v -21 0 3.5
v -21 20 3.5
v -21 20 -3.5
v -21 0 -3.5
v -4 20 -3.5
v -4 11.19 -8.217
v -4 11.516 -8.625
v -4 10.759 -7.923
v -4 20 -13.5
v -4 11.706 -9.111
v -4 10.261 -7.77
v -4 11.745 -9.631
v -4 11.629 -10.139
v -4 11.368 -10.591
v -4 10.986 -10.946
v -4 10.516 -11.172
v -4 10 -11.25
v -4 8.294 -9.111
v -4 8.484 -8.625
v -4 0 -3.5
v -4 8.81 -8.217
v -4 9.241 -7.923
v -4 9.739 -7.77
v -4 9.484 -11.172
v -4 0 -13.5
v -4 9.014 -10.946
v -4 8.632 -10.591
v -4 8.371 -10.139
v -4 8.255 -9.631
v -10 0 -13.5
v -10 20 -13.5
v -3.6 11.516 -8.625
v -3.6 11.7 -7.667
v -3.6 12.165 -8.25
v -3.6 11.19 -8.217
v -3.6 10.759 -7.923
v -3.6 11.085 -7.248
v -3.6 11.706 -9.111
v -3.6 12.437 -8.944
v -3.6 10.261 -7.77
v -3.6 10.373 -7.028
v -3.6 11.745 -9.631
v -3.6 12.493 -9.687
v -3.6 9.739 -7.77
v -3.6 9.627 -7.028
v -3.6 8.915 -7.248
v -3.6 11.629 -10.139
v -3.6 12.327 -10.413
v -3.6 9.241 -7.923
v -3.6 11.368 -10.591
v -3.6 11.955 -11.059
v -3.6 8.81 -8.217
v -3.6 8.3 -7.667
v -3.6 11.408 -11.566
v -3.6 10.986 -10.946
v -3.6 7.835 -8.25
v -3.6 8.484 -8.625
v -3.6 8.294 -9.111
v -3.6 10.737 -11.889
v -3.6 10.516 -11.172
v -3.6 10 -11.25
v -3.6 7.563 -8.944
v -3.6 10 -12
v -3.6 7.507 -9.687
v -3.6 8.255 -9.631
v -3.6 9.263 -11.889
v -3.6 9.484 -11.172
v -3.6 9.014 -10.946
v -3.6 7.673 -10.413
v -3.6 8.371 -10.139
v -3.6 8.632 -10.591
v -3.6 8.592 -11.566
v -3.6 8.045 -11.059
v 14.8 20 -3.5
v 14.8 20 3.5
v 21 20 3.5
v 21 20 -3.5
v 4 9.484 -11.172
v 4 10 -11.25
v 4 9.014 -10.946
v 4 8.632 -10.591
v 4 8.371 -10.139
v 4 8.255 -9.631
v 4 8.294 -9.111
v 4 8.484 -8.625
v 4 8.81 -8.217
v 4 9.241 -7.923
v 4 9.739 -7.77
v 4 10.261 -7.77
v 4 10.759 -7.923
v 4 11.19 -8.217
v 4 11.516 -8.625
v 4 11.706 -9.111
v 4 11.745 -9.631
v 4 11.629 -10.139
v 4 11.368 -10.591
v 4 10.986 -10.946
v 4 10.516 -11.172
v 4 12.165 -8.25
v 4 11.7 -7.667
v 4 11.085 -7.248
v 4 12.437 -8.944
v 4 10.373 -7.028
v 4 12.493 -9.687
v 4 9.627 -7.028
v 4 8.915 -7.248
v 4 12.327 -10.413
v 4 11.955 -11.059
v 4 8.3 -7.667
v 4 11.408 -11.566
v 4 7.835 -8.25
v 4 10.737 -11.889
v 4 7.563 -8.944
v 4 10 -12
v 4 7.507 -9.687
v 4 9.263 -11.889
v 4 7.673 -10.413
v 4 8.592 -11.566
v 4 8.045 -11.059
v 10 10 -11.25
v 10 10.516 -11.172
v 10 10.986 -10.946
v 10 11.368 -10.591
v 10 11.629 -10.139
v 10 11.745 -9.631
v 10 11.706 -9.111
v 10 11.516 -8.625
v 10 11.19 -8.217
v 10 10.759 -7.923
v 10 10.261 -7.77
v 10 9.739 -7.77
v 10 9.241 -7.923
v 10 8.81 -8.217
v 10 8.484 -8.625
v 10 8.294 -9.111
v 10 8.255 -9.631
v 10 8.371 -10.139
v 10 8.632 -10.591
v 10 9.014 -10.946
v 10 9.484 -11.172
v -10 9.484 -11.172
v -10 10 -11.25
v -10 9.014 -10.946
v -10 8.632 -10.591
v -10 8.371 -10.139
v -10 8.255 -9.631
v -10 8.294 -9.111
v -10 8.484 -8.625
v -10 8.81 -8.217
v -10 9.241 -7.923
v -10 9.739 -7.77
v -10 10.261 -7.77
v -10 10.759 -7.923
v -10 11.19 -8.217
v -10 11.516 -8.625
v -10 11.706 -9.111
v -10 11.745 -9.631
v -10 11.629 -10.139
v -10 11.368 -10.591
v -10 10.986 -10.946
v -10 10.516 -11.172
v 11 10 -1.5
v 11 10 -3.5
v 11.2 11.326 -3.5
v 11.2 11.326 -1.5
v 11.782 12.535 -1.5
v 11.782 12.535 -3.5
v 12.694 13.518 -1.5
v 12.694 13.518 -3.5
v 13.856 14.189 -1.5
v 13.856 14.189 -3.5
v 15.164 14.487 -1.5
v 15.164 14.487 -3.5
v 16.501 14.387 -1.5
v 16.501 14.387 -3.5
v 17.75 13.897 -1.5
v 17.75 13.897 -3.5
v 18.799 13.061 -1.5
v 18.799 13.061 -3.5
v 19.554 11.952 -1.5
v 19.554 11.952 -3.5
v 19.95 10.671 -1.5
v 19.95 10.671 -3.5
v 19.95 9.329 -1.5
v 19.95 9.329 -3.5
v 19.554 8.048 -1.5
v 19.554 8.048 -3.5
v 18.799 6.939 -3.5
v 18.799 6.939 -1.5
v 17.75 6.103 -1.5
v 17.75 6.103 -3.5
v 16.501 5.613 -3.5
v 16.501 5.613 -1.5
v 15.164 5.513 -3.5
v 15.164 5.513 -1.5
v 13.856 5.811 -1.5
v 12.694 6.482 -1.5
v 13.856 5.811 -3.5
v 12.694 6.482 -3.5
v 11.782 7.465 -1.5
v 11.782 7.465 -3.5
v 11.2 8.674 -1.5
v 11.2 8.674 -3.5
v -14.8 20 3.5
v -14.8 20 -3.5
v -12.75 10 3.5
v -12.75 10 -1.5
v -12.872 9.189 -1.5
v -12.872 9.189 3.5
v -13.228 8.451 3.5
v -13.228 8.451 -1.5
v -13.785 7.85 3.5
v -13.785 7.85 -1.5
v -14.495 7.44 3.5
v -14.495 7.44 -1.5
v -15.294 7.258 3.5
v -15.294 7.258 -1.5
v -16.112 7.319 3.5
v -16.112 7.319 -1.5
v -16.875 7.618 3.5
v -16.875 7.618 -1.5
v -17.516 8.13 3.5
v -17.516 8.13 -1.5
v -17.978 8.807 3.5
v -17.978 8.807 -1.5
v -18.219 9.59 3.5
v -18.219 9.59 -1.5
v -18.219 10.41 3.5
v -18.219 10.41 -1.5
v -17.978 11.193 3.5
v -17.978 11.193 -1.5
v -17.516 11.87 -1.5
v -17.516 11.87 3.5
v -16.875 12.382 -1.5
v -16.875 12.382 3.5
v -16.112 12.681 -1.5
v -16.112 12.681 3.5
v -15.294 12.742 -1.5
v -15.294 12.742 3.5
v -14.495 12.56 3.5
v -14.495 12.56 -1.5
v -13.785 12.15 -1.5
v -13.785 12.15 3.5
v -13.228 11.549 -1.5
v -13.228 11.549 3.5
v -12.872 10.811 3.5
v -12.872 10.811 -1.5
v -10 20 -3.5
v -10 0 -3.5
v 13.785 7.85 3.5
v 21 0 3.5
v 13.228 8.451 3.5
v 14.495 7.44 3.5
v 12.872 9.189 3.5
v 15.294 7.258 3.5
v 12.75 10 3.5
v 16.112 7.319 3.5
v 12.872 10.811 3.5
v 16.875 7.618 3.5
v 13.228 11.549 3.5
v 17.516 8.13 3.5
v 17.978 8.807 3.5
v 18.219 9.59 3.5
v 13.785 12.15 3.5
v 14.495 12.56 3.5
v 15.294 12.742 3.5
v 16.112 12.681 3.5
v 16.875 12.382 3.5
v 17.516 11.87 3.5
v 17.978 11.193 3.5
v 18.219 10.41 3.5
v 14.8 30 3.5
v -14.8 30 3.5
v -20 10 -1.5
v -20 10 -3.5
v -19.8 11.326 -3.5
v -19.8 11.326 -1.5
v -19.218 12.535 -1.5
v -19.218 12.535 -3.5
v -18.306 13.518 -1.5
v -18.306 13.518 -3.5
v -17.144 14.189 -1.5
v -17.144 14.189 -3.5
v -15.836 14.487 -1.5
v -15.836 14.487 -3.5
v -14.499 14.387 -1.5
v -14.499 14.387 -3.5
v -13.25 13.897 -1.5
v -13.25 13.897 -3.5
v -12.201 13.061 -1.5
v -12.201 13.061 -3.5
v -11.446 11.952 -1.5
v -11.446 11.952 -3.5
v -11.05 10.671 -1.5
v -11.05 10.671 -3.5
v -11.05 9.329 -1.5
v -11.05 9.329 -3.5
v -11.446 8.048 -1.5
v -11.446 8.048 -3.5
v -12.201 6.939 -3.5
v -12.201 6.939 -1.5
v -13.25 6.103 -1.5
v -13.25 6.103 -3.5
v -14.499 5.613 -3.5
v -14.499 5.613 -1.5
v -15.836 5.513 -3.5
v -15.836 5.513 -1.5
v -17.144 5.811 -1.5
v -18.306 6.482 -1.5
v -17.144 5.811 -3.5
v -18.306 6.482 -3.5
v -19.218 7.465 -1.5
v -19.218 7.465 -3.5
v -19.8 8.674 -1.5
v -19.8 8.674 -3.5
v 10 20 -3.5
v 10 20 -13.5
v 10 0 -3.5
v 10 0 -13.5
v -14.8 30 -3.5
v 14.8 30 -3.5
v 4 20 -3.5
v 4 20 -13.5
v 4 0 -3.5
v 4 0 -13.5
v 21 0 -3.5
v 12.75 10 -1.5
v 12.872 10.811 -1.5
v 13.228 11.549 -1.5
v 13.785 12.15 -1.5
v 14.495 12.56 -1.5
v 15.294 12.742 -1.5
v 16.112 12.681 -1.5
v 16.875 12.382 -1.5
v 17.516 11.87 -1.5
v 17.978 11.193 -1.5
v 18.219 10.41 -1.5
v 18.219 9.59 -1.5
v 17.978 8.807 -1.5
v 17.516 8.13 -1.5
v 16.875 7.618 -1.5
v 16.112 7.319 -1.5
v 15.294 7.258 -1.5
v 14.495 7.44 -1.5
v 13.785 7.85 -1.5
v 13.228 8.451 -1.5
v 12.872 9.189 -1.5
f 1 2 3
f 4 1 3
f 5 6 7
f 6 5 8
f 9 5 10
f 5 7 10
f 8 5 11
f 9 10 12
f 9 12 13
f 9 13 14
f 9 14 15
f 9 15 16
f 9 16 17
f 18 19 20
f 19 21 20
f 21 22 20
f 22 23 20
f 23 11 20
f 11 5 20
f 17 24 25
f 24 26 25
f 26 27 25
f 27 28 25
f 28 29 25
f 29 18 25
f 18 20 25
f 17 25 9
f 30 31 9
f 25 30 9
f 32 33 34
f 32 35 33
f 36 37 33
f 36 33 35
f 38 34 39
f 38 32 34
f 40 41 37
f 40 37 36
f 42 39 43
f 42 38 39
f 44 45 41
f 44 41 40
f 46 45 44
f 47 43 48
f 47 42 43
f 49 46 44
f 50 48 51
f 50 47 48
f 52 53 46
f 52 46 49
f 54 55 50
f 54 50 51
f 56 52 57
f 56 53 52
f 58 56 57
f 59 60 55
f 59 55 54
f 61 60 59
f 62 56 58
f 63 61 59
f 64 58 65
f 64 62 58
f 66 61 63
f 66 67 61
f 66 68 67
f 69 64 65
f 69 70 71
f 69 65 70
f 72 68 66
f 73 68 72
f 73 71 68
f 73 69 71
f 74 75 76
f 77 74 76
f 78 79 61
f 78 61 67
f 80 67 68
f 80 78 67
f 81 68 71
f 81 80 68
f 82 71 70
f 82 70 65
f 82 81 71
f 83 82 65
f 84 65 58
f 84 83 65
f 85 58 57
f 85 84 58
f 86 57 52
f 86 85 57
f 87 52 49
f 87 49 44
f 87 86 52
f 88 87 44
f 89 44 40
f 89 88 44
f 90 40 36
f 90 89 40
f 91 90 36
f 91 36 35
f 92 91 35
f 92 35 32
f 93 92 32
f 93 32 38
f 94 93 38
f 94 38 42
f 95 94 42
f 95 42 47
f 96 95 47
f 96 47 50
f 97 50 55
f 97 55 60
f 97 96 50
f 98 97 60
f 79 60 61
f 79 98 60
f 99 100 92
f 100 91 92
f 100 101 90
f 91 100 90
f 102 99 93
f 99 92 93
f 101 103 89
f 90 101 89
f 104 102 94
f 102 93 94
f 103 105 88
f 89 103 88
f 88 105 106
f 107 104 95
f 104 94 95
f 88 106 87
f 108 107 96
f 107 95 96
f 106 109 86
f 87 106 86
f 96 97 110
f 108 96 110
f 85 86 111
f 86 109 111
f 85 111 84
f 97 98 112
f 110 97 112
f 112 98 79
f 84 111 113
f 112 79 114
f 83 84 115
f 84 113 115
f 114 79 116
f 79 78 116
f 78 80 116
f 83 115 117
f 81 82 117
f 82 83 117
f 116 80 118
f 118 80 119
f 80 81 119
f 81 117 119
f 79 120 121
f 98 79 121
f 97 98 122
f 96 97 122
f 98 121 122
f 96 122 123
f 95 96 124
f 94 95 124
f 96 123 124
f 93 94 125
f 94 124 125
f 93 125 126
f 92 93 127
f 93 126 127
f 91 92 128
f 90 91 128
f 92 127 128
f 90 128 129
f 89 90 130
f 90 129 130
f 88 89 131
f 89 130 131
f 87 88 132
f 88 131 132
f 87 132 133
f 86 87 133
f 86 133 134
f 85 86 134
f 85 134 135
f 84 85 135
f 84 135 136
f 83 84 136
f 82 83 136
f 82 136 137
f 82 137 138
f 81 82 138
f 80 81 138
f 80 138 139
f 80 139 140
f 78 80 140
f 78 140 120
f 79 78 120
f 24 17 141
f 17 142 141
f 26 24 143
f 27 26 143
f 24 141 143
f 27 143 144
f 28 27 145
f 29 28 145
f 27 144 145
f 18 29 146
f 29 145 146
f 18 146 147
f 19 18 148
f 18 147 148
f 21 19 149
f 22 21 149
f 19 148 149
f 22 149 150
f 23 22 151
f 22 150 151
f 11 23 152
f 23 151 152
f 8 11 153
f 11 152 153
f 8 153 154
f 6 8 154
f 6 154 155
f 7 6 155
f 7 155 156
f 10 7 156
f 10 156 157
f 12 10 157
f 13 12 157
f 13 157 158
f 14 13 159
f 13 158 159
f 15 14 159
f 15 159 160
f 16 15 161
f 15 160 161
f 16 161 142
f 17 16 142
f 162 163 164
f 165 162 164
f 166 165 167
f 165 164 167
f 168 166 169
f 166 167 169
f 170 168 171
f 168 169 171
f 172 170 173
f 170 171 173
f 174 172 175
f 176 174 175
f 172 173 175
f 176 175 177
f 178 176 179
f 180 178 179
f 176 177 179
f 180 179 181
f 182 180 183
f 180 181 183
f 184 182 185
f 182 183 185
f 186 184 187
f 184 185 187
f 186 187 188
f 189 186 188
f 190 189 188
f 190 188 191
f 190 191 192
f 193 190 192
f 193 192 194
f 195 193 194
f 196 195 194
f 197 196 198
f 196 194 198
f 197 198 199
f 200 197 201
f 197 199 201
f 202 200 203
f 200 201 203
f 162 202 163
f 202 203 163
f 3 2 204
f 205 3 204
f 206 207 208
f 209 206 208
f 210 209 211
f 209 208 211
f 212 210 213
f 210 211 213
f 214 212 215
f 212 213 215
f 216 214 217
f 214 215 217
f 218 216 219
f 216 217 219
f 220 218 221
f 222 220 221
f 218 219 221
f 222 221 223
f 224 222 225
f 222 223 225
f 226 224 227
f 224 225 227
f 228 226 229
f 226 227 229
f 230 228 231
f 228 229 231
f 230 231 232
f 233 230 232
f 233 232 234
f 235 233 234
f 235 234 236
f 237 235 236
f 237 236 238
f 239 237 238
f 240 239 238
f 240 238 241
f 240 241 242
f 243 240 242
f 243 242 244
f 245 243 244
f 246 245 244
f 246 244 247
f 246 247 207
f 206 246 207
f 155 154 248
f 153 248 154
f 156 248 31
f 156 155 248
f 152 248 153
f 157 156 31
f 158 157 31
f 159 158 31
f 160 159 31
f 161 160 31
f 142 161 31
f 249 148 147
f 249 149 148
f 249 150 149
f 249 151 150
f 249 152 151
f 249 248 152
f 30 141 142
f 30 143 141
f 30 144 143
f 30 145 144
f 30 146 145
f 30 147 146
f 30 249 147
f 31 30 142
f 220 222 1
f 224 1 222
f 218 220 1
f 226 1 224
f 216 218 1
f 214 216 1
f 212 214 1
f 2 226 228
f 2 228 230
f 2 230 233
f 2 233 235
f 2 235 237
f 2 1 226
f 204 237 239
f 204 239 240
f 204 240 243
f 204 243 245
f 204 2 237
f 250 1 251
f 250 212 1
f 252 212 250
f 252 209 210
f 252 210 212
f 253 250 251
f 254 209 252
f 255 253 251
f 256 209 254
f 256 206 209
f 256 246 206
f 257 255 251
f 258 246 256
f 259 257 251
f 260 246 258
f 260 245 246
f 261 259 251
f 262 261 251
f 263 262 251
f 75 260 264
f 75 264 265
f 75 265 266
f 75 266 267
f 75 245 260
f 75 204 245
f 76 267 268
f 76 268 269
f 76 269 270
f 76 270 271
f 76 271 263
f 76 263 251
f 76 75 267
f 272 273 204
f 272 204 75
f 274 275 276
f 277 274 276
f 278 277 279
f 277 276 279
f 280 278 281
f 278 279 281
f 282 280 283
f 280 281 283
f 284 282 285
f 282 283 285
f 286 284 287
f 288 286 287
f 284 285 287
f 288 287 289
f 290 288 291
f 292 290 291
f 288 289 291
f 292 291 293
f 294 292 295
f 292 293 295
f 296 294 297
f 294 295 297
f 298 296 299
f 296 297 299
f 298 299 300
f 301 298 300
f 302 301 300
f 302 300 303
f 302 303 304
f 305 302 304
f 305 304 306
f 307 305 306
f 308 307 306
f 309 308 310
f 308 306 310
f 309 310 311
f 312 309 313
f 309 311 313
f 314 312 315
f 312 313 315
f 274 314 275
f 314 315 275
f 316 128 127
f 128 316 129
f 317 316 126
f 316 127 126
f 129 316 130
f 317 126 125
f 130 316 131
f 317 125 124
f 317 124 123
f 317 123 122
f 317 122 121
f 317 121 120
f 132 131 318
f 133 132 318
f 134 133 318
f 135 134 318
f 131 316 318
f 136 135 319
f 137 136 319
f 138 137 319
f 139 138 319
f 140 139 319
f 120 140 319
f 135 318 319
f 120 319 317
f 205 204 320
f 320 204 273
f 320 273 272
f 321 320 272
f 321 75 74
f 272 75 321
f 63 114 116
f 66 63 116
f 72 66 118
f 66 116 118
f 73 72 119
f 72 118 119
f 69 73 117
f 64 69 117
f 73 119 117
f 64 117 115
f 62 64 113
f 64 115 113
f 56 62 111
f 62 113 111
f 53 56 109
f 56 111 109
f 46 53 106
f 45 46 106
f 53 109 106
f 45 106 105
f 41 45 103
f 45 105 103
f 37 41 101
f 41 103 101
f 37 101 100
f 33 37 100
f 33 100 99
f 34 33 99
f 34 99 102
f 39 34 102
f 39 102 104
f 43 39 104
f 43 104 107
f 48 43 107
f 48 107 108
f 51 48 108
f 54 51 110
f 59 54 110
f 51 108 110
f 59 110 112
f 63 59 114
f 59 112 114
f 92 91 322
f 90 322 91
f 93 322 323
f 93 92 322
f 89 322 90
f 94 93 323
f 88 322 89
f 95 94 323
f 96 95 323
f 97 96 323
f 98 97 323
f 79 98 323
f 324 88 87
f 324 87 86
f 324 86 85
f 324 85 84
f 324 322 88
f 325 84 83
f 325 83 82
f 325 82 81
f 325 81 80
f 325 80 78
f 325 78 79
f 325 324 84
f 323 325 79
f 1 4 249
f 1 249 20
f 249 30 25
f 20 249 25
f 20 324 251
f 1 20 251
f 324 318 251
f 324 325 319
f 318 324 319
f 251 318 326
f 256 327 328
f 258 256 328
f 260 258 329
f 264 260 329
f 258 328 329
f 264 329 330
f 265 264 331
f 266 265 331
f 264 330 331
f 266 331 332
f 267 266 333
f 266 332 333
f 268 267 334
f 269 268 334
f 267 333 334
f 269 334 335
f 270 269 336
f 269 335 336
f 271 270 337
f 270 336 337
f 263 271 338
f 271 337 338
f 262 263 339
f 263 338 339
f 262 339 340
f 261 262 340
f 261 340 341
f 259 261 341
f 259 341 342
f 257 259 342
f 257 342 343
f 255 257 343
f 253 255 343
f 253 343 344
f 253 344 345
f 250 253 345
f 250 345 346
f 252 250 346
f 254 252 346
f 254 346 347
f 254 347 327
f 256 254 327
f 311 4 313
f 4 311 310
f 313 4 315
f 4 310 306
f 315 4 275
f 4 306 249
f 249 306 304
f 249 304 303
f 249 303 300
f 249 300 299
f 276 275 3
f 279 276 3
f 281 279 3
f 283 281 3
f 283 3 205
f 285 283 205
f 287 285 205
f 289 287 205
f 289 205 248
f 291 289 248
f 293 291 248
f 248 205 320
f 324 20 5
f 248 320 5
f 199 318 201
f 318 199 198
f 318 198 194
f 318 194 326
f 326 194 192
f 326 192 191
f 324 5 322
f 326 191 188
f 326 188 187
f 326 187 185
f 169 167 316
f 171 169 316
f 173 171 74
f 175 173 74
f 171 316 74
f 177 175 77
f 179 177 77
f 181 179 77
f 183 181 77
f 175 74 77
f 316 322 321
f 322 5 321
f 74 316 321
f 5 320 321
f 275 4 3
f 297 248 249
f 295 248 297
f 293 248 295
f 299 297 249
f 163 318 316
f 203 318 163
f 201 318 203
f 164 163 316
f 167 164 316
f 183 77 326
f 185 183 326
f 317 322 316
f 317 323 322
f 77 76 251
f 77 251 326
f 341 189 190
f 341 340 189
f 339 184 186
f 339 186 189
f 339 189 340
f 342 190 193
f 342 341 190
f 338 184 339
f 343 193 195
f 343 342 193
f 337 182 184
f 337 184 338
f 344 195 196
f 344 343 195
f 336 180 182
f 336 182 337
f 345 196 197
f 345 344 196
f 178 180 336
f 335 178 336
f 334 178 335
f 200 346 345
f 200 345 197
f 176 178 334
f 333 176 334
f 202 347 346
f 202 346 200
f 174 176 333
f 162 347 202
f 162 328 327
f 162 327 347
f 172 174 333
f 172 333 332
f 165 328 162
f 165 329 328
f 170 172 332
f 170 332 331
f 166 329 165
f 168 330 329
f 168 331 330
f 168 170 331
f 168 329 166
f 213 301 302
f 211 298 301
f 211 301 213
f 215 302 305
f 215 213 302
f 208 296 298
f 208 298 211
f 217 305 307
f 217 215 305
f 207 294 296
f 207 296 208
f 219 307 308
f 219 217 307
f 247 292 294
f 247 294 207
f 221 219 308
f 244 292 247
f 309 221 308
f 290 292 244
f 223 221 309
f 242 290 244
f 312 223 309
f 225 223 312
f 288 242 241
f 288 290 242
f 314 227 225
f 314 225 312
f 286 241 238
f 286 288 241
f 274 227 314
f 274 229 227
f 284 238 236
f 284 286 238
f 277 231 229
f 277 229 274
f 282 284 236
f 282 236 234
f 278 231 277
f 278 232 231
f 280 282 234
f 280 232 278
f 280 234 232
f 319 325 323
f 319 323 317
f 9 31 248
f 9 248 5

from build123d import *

# Parameters (mm, degrees)
SKETCH1_W           = 42
SKETCH1_H           = 7
SKETCH1_W_2         = 6
SKETCH1_H_2         = 10
BOSS_EXTRUDE1_DEPTH = 20
SKETCH6_R           = 2.75
CUT_EXTRUDE4_DEPTH  = 31.6757233
SKETCH7_R           = 4.5
CUT_EXTRUDE5_DEPTH  = 2
CUT_EXTRUDE6_REACH  = 41.284
SKETCH8_R           = 1.75
CUT_EXTRUDE7_REACH  = 41.284
SKETCH9_R           = 1.75
SKETCH10_W          = 29.6
SKETCH10_H          = 10
BOSS_EXTRUDE2_DEPTH = 7
SKETCH11_R          = 2.5
SKETCH11_R_2        = 1.75
BOSS_EXTRUDE3_DEPTH = 7.6


with BuildPart() as part:
    # Sketch1 → Boss-Extrude1 (new body)
    with BuildSketch(Plane(origin=(0, 0, 0), x_dir=(1, 0, 0), z_dir=(0, 1, 0))):
        Rectangle(SKETCH1_W, SKETCH1_H)
        with Locations((-7, 8.5)):
            Rectangle(SKETCH1_W_2, SKETCH1_H_2)
        with Locations((7, 8.5)):
            Rectangle(SKETCH1_W_2, SKETCH1_H_2)
    extrude(amount=BOSS_EXTRUDE1_DEPTH)

    # Sketch6 → Cut-Extrude4 (cut, through all)
    with BuildSketch(Plane(origin=(0, 0, -3.5), x_dir=(-1, 0, 0), z_dir=(0, 0, -1))):
        with Locations((-15.5, 10)):
            Circle(SKETCH6_R)
        with Locations(Location((15.5, 10, 0), (0, 0, 180))):
            Circle(SKETCH6_R)
    extrude(amount=-CUT_EXTRUDE4_DEPTH, mode=Mode.SUBTRACT)

    # Sketch7 → Cut-Extrude5 (cut)
    with BuildSketch(Plane(origin=(0, 0, -3.5), x_dir=(-1, 0, 0), z_dir=(0, 0, -1))):
        with Locations((-15.5, 10)):
            Circle(SKETCH7_R)
        with Locations((15.5, 10)):
            Circle(SKETCH7_R)
    extrude(amount=-CUT_EXTRUDE5_DEPTH, mode=Mode.SUBTRACT)

    # Sketch8 → Cut-Extrude6 (cut, up to next)
    with BuildSketch(Plane(origin=(10, 0, 0), x_dir=(0, 0, -1), z_dir=(1, 0, 0)), mode=Mode.PRIVATE) as cut_extrude6_sk1:
        with Locations((9.5, 10)):
            Circle(SKETCH8_R)
    cut_extrude6_tool1 = extrude(cut_extrude6_sk1.sketch, amount=-CUT_EXTRUDE6_REACH, mode=Mode.PRIVATE) & part.part
    add(cut_extrude6_tool1.solids().sort_by_distance((10, 10, -9.5))[0], mode=Mode.SUBTRACT)

    # Sketch9 → Cut-Extrude7 (cut, up to next)
    with BuildSketch(Plane.ZY.offset(10), mode=Mode.PRIVATE) as cut_extrude7_sk1:
        with Locations(Location((-9.5, 10, 0), (0, 0, 180))):
            Circle(SKETCH9_R)
    cut_extrude7_tool1 = extrude(cut_extrude7_sk1.sketch, amount=-CUT_EXTRUDE7_REACH, mode=Mode.PRIVATE) & part.part
    add(cut_extrude7_tool1.solids().sort_by_distance((-10, 10, -9.5))[0], mode=Mode.SUBTRACT)

    # Sketch10 → Boss-Extrude2 (add)
    with BuildSketch(Plane.XY.offset(3.5)):
        with Locations((0, 25)):
            Rectangle(SKETCH10_W, SKETCH10_H)
    extrude(amount=-BOSS_EXTRUDE2_DEPTH)


with BuildPart() as body_2:
    # Sketch11 → Boss-Extrude3 (new body)
    with BuildSketch(Plane.ZY.offset(-4)):
        with Locations(Location((-9.5, 10, 0), (0, 0, 180))):
            Circle(SKETCH11_R)
        with Locations(Location((-9.5, 10, 0), (0, 0, 180))):
            Circle(SKETCH11_R_2, mode=Mode.SUBTRACT)
    extrude(amount=BOSS_EXTRUDE3_DEPTH)


solid = Compound([part.part, body_2.part])
